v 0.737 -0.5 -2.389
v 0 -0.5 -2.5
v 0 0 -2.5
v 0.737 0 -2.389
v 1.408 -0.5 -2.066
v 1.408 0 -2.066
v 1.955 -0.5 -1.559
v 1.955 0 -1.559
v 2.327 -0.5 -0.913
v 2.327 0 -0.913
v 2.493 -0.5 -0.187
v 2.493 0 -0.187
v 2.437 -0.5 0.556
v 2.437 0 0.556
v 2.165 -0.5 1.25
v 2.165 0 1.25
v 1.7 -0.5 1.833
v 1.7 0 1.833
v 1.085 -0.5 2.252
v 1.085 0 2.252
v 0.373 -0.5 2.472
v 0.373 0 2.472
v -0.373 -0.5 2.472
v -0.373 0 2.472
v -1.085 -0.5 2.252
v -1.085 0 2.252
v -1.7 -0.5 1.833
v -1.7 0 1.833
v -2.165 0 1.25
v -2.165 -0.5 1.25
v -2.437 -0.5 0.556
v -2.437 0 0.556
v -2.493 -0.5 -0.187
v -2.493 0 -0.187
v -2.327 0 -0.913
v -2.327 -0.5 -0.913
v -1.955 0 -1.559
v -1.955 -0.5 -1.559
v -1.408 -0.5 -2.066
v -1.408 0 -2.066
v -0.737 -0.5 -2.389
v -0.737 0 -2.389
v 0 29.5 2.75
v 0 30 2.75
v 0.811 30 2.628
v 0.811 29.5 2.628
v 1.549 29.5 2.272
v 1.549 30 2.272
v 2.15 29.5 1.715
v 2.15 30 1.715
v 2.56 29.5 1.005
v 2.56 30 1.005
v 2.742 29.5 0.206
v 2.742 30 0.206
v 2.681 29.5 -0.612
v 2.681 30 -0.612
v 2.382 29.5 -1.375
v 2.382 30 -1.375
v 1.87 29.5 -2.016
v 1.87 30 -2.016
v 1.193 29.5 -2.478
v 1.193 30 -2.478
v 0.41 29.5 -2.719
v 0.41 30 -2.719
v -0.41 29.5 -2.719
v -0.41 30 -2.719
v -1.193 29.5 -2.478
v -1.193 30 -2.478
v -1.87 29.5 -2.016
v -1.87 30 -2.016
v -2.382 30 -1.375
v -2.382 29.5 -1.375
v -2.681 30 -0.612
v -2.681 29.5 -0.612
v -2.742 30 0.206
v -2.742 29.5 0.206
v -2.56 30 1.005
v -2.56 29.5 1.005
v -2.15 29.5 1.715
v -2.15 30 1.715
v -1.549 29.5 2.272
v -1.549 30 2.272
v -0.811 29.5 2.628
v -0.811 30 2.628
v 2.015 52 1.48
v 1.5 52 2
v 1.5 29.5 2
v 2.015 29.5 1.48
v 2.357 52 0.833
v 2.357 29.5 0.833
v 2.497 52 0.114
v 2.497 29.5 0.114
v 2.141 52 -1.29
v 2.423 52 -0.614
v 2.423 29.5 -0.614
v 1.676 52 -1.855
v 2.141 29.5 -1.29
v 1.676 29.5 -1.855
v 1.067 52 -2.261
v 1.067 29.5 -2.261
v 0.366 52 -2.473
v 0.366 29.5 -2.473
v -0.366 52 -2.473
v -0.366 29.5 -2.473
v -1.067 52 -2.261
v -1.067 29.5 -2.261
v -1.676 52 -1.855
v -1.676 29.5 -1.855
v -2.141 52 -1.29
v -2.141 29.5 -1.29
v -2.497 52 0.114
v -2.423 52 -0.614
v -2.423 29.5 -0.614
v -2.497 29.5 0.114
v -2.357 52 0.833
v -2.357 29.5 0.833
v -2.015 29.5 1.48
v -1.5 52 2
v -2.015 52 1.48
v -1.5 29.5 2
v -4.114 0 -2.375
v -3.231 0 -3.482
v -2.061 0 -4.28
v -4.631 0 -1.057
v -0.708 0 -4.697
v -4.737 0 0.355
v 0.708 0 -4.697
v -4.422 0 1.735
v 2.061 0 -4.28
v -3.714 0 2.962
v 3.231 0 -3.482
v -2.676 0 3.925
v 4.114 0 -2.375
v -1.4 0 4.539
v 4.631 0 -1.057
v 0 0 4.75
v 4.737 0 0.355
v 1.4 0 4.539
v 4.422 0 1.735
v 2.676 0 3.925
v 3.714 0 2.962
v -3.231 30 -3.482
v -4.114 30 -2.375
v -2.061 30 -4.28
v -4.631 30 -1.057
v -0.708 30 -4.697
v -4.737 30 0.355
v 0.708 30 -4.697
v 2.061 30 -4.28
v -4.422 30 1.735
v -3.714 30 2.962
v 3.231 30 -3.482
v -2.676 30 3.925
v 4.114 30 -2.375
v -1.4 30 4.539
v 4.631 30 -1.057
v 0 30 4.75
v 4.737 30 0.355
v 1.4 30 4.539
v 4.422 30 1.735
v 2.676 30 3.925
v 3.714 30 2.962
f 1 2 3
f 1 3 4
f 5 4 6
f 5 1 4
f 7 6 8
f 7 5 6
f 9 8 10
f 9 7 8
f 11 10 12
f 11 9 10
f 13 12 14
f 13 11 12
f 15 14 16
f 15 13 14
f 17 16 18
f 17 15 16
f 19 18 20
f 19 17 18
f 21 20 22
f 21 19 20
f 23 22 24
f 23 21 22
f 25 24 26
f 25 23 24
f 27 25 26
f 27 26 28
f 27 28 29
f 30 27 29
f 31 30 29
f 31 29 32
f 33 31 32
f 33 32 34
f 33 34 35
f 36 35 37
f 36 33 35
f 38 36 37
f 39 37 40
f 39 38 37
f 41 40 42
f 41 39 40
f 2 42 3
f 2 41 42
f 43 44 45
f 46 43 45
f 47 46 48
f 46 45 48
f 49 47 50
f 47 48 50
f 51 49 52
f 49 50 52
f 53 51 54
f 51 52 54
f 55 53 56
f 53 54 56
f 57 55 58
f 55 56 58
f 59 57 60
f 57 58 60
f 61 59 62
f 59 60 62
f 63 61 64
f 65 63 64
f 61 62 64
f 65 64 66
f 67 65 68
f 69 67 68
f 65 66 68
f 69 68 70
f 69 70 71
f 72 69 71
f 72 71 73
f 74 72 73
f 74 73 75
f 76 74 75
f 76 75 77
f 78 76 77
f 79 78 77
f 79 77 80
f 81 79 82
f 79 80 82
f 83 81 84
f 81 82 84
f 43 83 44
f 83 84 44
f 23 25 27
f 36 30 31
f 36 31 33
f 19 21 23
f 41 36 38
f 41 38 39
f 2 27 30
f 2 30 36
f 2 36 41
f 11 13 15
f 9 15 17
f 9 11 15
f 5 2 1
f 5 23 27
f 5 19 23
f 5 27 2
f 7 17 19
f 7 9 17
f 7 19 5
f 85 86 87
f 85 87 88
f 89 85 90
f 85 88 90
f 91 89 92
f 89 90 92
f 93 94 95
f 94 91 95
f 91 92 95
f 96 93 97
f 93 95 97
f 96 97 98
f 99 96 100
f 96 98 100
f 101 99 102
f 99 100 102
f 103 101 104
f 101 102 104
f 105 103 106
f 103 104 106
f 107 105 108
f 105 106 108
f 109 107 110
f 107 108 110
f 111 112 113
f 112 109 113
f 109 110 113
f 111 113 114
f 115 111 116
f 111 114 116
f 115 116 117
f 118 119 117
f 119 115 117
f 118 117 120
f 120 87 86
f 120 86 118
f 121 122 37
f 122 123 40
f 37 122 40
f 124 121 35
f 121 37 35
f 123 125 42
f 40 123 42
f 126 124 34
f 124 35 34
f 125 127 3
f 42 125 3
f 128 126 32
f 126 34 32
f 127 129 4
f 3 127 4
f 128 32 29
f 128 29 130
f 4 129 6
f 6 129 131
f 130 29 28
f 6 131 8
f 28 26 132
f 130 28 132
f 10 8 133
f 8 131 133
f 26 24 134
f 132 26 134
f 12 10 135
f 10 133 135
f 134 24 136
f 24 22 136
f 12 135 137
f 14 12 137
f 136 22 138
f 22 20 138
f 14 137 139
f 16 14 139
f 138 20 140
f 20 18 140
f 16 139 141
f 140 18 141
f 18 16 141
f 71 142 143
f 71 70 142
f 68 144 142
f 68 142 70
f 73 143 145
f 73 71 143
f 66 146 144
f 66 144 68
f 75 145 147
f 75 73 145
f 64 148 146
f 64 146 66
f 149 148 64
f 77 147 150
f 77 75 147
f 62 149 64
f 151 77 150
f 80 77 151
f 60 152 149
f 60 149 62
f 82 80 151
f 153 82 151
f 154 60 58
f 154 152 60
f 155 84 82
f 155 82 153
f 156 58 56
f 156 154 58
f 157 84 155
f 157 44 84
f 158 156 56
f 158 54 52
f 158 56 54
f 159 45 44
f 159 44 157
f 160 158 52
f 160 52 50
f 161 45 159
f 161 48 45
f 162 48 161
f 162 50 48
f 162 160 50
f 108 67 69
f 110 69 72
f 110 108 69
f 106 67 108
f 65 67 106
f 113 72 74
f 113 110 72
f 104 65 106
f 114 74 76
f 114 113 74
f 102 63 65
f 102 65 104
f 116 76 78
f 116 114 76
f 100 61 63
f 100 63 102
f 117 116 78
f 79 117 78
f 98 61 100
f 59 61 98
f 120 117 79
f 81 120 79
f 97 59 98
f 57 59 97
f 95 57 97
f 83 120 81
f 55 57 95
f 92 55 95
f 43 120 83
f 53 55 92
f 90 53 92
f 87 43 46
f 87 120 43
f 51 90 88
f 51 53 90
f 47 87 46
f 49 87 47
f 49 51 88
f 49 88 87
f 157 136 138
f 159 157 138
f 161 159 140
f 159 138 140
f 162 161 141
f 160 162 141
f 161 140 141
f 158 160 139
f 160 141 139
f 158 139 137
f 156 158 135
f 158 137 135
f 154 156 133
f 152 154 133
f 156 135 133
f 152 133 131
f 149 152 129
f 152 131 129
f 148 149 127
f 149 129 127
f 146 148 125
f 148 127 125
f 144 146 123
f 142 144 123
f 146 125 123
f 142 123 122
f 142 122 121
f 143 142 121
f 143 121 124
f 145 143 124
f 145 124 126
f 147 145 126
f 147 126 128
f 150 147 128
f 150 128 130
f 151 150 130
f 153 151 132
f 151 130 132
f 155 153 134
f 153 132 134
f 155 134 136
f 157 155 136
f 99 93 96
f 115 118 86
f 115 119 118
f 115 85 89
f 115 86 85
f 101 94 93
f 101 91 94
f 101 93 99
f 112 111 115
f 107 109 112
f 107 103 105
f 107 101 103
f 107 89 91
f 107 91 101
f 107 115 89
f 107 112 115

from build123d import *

# Parameters (mm, degrees)
SKETCH_1_R          = 4.75
EXTRUDE_1_DEPTH     = 30
SKETCH_2_R          = 2.75
CUT_EXTRUDE_1_DEPTH = 0.5
SKETCH_3_R          = 2.5
EXTRUDE_2_DEPTH     = 22.5
EXTRUDE_START       = 0.5
SKETCH_4_R          = 2.5
EXTRUDE_3_DEPTH     = 0.5
CUT_EXTRUDE_START   = -22.5
CUT_EXTRUDE_2_DEPTH = 22.5


with BuildPart() as part:
    # 草图1 → 凸台-拉伸1 (new body)
    with BuildSketch(Plane(origin=(0, 0, 0), x_dir=(1, 0, 0), z_dir=(0, 1, 0))):
        with Locations(Location((0, 0, 0), (0, 0, 270))):
            Circle(SKETCH_1_R)
    extrude(amount=EXTRUDE_1_DEPTH)

    # 草图2 → 切除-拉伸1 (cut)
    with BuildSketch(Plane(origin=(0, 30, 0), x_dir=(1, 0, 0), z_dir=(0, 1, 0))):
        with Locations(Location((0, 0, 0), (0, 0, 270))):
            Circle(SKETCH_2_R)
    extrude(amount=-CUT_EXTRUDE_1_DEPTH, mode=Mode.SUBTRACT)

    # 草图3 → 凸台-拉伸2 (add)
    with BuildSketch(Plane(origin=(0, 29.5, 0), x_dir=(1, 0, 0), z_dir=(0, 1, 0))):
        with Locations(Location((0, 0, 0), (0, 0, 90))):
            Circle(SKETCH_3_R)
    extrude(amount=EXTRUDE_2_DEPTH)

    # 草图4 → 凸台-拉伸3 (add)
    with BuildSketch(Plane.XZ.offset(EXTRUDE_START)):
        with Locations(Location((0, 0, 0), (0, 0, 270))):
            Circle(SKETCH_4_R)
    extrude(amount=-EXTRUDE_3_DEPTH)

    # 草图5 → 切除-拉伸2 (cut)
    with BuildSketch(Plane(origin=(0, 52, 0), x_dir=(1, 0, 0), z_dir=(0, 1, 0)).offset(CUT_EXTRUDE_START)):
        with BuildLine():
            Line((1.5, -2), (-1.5, -2))
            ThreePointArc((-1.5, -2), (0, -2.5), (1.5, -2))
        make_face()
    extrude(amount=CUT_EXTRUDE_2_DEPTH, mode=Mode.SUBTRACT)


solid = part.part
